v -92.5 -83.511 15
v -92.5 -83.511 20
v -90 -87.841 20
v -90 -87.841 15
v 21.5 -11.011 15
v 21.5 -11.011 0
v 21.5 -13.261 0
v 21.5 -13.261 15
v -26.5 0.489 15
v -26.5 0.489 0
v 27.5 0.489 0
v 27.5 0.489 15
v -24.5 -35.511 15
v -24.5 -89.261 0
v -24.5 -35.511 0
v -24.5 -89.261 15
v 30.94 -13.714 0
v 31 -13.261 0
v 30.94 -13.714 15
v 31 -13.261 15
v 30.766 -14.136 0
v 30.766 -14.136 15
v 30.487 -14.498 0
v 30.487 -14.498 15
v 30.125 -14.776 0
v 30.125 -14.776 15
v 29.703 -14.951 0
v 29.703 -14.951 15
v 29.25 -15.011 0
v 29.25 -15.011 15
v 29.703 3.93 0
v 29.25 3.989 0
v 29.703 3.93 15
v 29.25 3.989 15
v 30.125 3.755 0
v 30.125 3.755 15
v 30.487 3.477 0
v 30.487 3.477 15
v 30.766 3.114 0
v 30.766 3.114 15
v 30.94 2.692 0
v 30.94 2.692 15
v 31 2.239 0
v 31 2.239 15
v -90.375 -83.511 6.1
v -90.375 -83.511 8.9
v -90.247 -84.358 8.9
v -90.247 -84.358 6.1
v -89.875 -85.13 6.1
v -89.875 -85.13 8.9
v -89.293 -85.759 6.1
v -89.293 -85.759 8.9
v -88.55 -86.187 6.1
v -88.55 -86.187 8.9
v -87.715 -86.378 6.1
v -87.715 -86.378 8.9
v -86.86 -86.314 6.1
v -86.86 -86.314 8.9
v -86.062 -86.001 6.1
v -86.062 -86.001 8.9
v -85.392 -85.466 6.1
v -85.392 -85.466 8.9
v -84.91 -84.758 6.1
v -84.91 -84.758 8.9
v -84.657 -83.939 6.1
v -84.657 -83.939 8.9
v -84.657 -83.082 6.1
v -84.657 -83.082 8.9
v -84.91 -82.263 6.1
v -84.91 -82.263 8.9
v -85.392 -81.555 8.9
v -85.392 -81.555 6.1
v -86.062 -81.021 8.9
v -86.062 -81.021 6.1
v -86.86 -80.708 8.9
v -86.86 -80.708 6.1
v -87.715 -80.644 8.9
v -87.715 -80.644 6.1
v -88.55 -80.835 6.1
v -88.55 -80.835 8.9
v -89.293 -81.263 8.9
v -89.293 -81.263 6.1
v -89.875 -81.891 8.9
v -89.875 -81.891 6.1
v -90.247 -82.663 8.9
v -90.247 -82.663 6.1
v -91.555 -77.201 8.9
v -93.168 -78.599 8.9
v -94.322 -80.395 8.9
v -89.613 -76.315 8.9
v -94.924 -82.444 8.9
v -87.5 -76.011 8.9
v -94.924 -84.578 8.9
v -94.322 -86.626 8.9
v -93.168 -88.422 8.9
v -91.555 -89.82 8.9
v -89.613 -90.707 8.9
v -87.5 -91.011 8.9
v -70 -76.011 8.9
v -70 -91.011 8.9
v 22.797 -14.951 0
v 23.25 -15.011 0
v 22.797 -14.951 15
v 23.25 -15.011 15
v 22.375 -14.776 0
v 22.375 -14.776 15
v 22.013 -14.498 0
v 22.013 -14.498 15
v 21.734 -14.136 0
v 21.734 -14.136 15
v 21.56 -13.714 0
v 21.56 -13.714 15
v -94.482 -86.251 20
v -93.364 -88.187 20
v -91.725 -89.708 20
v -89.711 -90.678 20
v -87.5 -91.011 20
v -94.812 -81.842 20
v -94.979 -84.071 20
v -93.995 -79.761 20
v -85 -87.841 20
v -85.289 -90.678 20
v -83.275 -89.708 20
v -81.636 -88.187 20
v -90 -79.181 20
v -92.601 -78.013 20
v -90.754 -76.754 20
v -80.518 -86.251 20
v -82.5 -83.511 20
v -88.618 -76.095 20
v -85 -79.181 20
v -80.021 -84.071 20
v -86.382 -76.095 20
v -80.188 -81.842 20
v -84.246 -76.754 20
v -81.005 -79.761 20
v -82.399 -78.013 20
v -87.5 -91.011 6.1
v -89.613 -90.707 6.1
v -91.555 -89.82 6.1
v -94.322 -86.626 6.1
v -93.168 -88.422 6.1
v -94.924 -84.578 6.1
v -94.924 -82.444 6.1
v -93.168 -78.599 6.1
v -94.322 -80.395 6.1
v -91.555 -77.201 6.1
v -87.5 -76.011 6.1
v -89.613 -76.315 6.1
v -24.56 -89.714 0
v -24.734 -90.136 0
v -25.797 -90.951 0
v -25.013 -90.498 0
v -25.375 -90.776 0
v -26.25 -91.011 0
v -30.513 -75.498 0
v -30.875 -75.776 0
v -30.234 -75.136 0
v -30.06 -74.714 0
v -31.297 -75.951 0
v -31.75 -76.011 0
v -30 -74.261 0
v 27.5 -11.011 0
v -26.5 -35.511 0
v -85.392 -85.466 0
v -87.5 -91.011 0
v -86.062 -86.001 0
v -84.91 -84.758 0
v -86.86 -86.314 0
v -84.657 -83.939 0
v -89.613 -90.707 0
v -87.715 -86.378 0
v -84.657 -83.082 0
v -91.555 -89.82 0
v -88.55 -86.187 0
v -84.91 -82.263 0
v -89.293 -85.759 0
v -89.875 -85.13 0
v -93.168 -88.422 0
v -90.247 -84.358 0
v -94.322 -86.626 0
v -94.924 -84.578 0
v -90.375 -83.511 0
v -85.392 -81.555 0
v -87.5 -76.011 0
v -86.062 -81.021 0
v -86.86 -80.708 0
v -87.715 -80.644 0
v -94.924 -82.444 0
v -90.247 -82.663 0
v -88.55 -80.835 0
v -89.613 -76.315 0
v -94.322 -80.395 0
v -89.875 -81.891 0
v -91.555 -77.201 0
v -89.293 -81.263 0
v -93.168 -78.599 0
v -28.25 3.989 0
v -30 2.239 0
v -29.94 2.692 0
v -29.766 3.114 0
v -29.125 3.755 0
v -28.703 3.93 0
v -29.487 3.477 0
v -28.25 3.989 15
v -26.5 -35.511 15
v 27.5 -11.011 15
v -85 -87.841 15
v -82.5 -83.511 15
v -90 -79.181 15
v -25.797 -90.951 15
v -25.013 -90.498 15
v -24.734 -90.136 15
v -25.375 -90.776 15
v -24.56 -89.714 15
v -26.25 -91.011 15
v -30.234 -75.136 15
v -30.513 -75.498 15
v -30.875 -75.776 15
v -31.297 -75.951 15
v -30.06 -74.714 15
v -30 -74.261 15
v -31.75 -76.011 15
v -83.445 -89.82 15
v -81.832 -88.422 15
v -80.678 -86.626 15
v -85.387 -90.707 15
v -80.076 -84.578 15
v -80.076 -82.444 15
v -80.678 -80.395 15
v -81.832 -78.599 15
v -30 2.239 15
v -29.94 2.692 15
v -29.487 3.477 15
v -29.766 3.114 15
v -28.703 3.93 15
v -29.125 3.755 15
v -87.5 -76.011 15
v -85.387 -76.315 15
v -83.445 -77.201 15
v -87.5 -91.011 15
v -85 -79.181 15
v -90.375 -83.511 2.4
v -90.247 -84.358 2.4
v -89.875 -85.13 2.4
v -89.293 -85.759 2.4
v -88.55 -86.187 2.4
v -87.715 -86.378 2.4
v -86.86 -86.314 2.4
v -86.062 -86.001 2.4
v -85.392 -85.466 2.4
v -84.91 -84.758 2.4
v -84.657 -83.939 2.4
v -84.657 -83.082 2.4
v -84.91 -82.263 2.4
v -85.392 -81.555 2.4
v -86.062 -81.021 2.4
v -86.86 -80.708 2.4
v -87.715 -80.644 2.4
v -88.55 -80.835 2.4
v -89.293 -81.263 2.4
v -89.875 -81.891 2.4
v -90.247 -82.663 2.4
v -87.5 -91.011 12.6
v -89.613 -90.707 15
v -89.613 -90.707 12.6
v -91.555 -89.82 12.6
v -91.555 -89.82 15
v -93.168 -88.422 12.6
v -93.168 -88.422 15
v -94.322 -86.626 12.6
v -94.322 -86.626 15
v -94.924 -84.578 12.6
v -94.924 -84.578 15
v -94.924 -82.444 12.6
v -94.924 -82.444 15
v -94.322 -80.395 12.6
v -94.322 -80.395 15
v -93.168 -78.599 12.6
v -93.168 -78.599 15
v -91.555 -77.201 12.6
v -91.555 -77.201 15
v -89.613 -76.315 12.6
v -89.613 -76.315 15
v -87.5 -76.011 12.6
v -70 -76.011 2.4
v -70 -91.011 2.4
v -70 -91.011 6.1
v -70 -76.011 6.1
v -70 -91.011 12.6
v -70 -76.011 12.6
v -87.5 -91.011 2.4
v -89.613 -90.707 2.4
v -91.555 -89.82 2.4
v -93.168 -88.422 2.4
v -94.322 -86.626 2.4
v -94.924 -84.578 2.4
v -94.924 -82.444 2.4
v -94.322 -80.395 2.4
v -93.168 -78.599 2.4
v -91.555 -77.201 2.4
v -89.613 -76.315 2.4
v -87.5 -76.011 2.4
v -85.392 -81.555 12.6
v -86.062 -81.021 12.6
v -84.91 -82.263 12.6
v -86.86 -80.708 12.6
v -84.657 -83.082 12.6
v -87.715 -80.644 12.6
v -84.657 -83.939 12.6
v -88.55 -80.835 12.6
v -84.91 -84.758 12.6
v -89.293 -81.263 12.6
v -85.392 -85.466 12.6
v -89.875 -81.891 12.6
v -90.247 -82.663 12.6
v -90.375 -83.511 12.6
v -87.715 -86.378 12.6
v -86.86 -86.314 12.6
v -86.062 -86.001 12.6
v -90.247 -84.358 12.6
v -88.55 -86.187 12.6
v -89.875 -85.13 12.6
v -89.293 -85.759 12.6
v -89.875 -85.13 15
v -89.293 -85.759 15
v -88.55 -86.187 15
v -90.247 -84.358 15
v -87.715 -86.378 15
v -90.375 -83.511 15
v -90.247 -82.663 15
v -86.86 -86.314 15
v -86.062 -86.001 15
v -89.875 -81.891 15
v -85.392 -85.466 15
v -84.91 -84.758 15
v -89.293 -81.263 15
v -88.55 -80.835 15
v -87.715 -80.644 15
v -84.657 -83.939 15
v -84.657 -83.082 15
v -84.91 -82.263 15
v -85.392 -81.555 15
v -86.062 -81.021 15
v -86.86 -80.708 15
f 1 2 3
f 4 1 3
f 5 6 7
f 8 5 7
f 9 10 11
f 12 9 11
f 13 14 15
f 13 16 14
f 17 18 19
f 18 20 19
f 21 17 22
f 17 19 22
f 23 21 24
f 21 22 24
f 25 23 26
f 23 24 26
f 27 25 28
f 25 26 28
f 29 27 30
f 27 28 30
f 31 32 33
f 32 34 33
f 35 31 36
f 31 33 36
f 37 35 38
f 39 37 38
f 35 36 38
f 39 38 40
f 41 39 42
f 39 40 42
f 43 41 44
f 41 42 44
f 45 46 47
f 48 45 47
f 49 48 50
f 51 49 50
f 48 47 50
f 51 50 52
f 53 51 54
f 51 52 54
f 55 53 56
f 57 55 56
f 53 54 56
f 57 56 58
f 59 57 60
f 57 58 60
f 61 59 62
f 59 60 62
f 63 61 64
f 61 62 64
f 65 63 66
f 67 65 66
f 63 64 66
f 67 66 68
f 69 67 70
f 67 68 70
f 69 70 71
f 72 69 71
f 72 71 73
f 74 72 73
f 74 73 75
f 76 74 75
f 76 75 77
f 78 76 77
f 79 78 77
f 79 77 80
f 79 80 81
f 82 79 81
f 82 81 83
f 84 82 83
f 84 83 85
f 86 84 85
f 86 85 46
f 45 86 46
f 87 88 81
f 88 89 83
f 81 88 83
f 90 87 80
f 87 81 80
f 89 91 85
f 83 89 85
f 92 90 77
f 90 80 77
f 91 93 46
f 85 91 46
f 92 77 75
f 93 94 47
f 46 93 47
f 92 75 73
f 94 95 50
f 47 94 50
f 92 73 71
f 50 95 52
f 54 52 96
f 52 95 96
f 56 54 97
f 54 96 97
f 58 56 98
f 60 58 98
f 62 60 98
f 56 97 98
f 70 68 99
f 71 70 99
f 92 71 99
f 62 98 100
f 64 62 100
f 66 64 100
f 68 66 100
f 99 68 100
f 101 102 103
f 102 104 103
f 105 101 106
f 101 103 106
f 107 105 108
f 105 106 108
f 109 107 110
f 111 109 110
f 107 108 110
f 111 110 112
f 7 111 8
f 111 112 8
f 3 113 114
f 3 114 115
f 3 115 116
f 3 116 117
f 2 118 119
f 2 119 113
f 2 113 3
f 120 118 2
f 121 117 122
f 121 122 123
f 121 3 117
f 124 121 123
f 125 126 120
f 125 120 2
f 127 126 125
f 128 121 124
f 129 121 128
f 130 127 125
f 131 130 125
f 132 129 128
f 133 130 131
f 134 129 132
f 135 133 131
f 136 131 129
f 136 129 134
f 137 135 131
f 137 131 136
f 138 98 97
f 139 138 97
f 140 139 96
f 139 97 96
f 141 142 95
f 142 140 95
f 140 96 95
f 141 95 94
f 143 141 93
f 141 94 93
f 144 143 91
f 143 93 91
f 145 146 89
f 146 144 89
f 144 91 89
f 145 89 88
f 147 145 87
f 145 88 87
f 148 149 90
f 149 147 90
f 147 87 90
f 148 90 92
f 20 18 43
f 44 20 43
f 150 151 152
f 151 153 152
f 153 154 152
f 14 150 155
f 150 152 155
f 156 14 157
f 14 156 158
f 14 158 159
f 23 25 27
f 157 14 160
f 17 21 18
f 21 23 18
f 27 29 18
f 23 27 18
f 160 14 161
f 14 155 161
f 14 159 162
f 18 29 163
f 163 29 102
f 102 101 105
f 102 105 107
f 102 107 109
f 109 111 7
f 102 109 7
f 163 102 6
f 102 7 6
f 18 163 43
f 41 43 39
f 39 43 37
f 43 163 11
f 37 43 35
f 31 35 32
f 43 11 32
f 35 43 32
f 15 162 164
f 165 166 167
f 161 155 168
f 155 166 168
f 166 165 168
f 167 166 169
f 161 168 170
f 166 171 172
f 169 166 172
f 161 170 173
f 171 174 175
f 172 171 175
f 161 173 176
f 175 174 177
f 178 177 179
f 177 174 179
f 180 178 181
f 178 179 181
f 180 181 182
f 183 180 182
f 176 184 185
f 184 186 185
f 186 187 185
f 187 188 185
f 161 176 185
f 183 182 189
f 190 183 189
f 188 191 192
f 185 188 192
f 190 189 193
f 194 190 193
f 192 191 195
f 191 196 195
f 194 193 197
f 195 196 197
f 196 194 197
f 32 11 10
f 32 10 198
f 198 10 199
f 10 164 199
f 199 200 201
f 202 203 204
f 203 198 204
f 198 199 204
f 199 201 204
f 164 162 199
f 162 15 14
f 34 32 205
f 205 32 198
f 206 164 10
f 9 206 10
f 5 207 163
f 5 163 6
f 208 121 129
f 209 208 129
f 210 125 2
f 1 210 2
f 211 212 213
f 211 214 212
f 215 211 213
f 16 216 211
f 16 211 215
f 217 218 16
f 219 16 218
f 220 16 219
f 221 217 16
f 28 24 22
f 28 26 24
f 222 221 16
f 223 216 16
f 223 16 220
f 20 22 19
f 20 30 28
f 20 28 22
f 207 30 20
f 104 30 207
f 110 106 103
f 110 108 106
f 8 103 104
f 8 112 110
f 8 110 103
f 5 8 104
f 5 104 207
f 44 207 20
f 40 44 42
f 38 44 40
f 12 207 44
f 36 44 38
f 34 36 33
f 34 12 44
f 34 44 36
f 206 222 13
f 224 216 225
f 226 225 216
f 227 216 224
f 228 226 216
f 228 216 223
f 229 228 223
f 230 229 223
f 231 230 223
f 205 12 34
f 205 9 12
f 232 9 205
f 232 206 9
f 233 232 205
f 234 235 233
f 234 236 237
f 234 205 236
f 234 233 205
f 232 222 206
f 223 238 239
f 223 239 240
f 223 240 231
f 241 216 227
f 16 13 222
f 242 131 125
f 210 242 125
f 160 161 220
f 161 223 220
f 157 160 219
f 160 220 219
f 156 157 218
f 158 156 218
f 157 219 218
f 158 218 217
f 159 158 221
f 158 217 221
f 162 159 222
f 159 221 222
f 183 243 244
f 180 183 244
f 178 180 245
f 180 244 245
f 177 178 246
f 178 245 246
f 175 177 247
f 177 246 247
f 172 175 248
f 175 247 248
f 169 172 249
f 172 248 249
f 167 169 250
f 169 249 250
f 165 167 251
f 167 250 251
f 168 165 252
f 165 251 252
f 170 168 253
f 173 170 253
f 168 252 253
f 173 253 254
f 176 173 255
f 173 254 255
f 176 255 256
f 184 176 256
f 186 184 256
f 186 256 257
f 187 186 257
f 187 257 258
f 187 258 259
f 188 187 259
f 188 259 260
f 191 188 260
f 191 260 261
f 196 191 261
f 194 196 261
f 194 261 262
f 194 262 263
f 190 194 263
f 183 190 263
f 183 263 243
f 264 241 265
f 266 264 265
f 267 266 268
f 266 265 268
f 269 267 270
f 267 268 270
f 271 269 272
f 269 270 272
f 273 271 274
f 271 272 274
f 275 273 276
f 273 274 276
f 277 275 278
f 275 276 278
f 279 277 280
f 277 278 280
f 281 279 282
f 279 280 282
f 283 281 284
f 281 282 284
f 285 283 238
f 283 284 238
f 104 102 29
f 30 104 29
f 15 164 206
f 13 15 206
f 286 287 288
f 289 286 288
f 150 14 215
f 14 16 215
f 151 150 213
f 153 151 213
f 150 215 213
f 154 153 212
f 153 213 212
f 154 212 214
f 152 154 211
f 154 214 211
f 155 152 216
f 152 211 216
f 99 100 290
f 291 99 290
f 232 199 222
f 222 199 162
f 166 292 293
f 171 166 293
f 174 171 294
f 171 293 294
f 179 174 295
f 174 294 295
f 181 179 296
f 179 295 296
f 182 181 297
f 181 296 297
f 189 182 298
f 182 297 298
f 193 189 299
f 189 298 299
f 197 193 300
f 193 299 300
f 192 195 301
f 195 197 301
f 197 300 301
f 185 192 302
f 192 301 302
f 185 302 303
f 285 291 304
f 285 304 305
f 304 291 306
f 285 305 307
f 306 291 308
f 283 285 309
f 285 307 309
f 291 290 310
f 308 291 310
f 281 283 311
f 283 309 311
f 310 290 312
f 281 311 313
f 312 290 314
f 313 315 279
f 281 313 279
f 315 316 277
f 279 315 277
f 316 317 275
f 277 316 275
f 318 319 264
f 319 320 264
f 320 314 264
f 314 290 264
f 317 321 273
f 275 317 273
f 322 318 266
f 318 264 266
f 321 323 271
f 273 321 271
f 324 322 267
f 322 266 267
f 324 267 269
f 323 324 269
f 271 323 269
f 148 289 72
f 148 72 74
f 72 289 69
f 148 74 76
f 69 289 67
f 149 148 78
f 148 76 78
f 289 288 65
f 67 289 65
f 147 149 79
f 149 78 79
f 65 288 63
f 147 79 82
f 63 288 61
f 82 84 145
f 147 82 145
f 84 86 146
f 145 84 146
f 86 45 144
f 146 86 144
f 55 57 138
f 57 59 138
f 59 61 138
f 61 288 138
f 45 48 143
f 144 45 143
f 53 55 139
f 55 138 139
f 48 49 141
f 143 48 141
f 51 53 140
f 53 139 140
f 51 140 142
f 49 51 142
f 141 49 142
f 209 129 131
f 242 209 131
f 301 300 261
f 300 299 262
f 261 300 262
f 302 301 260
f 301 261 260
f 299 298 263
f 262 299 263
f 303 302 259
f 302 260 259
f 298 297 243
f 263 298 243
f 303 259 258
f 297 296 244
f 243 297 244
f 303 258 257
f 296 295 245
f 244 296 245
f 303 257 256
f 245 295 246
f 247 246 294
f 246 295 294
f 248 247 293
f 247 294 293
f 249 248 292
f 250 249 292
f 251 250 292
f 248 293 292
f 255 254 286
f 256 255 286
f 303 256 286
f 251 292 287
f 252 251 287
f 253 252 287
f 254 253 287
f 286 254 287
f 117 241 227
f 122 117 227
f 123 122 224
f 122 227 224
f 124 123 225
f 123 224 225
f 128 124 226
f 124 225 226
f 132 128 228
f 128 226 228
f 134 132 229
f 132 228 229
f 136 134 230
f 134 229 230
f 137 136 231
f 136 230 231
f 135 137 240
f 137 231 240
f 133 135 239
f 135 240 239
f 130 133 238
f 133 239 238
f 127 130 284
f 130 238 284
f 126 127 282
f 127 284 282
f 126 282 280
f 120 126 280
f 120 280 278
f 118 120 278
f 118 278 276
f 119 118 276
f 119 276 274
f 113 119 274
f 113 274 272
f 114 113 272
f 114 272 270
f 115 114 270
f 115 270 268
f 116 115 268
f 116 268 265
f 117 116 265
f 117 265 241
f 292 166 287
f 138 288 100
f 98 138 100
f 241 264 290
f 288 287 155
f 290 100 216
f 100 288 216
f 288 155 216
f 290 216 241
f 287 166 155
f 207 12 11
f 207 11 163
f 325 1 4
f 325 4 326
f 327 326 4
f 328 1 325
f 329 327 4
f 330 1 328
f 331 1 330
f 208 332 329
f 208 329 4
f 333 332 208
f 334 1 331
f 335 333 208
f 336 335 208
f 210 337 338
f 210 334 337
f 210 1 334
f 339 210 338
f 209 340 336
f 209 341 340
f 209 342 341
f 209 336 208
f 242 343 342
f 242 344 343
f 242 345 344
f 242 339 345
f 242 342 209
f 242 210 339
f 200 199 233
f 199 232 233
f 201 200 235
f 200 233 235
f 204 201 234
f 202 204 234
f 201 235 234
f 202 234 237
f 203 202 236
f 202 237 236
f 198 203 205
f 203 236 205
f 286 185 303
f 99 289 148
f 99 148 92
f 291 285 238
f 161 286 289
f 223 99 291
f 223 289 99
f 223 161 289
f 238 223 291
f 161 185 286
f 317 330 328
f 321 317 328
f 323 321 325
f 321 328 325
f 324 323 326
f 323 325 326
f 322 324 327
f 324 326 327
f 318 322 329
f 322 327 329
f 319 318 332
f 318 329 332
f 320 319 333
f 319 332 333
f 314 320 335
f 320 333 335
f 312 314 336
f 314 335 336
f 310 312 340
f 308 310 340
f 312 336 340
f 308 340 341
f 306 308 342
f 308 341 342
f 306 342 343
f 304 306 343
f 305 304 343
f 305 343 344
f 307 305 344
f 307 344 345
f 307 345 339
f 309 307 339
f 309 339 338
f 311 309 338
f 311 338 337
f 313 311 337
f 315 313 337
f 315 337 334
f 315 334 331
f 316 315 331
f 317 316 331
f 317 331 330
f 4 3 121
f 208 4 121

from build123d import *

# Parameters (mm, degrees)
F0_W      = 2
F0_H      = 10
F0_H_2    = 15
F1_DEPTH  = 15
F2_W      = 15
F2_H      = 15
F3_DEPTH  = 65
F5_DEPTH  = 25
F6_DEPTH  = 5
F7_R      = 2.875
F8_DEPTH  = 5
F9_DEPTH  = 25
F10_W     = 10
F10_H     = 3.7
F10_W_2   = 7.5
F11_DEPTH = 25
F12_W     = 30.5
F12_H     = 15
F13_DEPTH = 2
F14_R     = 1.75


with BuildPart() as f1:
    # F0 (on Top) → F1 (new body)
    with BuildSketch(Plane.XY):
        with Locations((-25.5, -71.0108693689)):
            Rectangle(F0_W, F0_H)
        Polygon((31, 3.9891306311), (-30, 3.9891306311), (-30, -91.0108693689), (-26.5, -91.0108693689), (-26.5, -76.0108693689), (-26.5, -66.0108693689), (-26.5, 0.4891306311), (27.5, 0.4891306311), (27.5, -11.0108693689), (21.5, -11.0108693689), (21.5, -15.0108693689), (31, -15.0108693689), align=None)
        with Locations((-25.5, -83.5108693689)):
            Rectangle(F0_W, F0_H_2)
    extrude(amount=F1_DEPTH)

    # F2 (on face) → F3 (join)
    with BuildSketch(Plane(origin=(-30, 0, 0), x_dir=(0, -1, 0), z_dir=(-1, 0, 0))):
        with Locations((83.5108693689, 7.5)):
            Rectangle(F2_W, F2_H)
    extrude(amount=F3_DEPTH)

    # F4 (on face) → F5 (cut)
    with BuildSketch(Plane.XY.offset(15)):
        with BuildLine():
            ThreePointArc((-95, -83.5108693689), (-92.8033008589, -78.20756851), (-87.5, -76.0108693689))
            Line((-87.5, -76.0108693689), (-95, -76.0108693689))
            Line((-95, -76.0108693689), (-95, -83.5108693689))
        make_face()
        with BuildLine():
            Line((-95, -91.0108693689), (-87.5, -91.0108693689))
            ThreePointArc((-87.5, -91.0108693689), (-92.8033008589, -88.8141702278), (-95, -83.5108693689))
            Line((-95, -83.5108693689), (-95, -91.0108693689))
        make_face()
    extrude(amount=-F5_DEPTH, mode=Mode.SUBTRACT)

    # F4 (on face) → F6 (join)
    with BuildSketch(Plane.XY.offset(15)):
        with BuildLine():
            ThreePointArc((-80, -83.5108693689), (-82.1966991411, -78.20756851), (-87.5, -76.0108693689))
            ThreePointArc((-87.5, -76.0108693689), (-92.8033008589, -78.20756851), (-95, -83.5108693689))
            ThreePointArc((-95, -83.5108693689), (-92.8033008589, -88.8141702278), (-87.5, -91.0108693689))
            ThreePointArc((-87.5, -91.0108693689), (-82.1966991411, -88.8141702278), (-80, -83.5108693689))
        make_face()
        with BuildLine():
            ThreePointArc((-84.625, -83.5108693689), (-87.5, -86.3858693689), (-90.375, -83.5108693689))
            ThreePointArc((-90.375, -83.5108693689), (-87.5, -80.6358693689), (-84.625, -83.5108693689))
        make_face(mode=Mode.SUBTRACT)
    extrude(amount=F6_DEPTH)

    # F7 (on face) → F8 (cut)
    with BuildSketch(Plane.XY.offset(20)):
        Polygon((-85, -79.18074235), (-90, -79.18074235), (-92.5, -83.5108693689), (-90, -87.8409963878), (-85, -87.8409963878), (-82.5, -83.5108693689), align=None)
        with Locations((-87.5, -83.5108693689)):
            Circle(F7_R, mode=Mode.SUBTRACT)
    extrude(amount=-F8_DEPTH, mode=Mode.SUBTRACT)

    # F4 (on face) → F9 (cut)
    with BuildSketch(Plane.XY.offset(15)):
        with BuildLine():
            ThreePointArc((-84.625, -83.5108693689), (-87.5, -80.6358693689), (-90.375, -83.5108693689))
            ThreePointArc((-90.375, -83.5108693689), (-87.5, -86.3858693689), (-84.625, -83.5108693689))
        make_face()
    extrude(amount=-F9_DEPTH, mode=Mode.SUBTRACT)

    # F10 (on face) → F11 (cut)
    with BuildSketch(Plane.XZ.offset(91.0108693689)):
        with Locations((-75, 10.75)):
            Rectangle(F10_W, F10_H)
        with Locations((-91.25, 10.75)):
            Rectangle(F10_W_2, F10_H)
        with Locations((-83.75, 10.75)):
            Rectangle(F10_W_2, F10_H)
        with Locations((-83.75, 4.25)):
            Rectangle(F10_W_2, F10_H)
        with Locations((-91.25, 4.25)):
            Rectangle(F10_W_2, F10_H)
        with Locations((-75, 4.25)):
            Rectangle(F10_W, F10_H)
    extrude(amount=-F11_DEPTH, mode=Mode.SUBTRACT)

    # F12 (on face) → F13 (join)
    with BuildSketch(Plane.YZ.offset(-26.5)):
        with Locations((-50.7608693689, 7.5)):
            Rectangle(F12_W, F12_H)
    extrude(amount=F13_DEPTH)

    # F14
    f14_edges = [f1.edges().sort_by_distance(p)[0] for p in [
        (-30, -76.010869, 7.5),
        (-30, 3.989131, 7.5),
        (31, 3.989131, 7.5),
        (31, -15.010869, 7.5),
        (21.5, -15.010869, 7.5),
        (-24.5, -91.010869, 7.5),
    ]]
    fillet(f14_edges, radius=F14_R)


solid = f1.part
